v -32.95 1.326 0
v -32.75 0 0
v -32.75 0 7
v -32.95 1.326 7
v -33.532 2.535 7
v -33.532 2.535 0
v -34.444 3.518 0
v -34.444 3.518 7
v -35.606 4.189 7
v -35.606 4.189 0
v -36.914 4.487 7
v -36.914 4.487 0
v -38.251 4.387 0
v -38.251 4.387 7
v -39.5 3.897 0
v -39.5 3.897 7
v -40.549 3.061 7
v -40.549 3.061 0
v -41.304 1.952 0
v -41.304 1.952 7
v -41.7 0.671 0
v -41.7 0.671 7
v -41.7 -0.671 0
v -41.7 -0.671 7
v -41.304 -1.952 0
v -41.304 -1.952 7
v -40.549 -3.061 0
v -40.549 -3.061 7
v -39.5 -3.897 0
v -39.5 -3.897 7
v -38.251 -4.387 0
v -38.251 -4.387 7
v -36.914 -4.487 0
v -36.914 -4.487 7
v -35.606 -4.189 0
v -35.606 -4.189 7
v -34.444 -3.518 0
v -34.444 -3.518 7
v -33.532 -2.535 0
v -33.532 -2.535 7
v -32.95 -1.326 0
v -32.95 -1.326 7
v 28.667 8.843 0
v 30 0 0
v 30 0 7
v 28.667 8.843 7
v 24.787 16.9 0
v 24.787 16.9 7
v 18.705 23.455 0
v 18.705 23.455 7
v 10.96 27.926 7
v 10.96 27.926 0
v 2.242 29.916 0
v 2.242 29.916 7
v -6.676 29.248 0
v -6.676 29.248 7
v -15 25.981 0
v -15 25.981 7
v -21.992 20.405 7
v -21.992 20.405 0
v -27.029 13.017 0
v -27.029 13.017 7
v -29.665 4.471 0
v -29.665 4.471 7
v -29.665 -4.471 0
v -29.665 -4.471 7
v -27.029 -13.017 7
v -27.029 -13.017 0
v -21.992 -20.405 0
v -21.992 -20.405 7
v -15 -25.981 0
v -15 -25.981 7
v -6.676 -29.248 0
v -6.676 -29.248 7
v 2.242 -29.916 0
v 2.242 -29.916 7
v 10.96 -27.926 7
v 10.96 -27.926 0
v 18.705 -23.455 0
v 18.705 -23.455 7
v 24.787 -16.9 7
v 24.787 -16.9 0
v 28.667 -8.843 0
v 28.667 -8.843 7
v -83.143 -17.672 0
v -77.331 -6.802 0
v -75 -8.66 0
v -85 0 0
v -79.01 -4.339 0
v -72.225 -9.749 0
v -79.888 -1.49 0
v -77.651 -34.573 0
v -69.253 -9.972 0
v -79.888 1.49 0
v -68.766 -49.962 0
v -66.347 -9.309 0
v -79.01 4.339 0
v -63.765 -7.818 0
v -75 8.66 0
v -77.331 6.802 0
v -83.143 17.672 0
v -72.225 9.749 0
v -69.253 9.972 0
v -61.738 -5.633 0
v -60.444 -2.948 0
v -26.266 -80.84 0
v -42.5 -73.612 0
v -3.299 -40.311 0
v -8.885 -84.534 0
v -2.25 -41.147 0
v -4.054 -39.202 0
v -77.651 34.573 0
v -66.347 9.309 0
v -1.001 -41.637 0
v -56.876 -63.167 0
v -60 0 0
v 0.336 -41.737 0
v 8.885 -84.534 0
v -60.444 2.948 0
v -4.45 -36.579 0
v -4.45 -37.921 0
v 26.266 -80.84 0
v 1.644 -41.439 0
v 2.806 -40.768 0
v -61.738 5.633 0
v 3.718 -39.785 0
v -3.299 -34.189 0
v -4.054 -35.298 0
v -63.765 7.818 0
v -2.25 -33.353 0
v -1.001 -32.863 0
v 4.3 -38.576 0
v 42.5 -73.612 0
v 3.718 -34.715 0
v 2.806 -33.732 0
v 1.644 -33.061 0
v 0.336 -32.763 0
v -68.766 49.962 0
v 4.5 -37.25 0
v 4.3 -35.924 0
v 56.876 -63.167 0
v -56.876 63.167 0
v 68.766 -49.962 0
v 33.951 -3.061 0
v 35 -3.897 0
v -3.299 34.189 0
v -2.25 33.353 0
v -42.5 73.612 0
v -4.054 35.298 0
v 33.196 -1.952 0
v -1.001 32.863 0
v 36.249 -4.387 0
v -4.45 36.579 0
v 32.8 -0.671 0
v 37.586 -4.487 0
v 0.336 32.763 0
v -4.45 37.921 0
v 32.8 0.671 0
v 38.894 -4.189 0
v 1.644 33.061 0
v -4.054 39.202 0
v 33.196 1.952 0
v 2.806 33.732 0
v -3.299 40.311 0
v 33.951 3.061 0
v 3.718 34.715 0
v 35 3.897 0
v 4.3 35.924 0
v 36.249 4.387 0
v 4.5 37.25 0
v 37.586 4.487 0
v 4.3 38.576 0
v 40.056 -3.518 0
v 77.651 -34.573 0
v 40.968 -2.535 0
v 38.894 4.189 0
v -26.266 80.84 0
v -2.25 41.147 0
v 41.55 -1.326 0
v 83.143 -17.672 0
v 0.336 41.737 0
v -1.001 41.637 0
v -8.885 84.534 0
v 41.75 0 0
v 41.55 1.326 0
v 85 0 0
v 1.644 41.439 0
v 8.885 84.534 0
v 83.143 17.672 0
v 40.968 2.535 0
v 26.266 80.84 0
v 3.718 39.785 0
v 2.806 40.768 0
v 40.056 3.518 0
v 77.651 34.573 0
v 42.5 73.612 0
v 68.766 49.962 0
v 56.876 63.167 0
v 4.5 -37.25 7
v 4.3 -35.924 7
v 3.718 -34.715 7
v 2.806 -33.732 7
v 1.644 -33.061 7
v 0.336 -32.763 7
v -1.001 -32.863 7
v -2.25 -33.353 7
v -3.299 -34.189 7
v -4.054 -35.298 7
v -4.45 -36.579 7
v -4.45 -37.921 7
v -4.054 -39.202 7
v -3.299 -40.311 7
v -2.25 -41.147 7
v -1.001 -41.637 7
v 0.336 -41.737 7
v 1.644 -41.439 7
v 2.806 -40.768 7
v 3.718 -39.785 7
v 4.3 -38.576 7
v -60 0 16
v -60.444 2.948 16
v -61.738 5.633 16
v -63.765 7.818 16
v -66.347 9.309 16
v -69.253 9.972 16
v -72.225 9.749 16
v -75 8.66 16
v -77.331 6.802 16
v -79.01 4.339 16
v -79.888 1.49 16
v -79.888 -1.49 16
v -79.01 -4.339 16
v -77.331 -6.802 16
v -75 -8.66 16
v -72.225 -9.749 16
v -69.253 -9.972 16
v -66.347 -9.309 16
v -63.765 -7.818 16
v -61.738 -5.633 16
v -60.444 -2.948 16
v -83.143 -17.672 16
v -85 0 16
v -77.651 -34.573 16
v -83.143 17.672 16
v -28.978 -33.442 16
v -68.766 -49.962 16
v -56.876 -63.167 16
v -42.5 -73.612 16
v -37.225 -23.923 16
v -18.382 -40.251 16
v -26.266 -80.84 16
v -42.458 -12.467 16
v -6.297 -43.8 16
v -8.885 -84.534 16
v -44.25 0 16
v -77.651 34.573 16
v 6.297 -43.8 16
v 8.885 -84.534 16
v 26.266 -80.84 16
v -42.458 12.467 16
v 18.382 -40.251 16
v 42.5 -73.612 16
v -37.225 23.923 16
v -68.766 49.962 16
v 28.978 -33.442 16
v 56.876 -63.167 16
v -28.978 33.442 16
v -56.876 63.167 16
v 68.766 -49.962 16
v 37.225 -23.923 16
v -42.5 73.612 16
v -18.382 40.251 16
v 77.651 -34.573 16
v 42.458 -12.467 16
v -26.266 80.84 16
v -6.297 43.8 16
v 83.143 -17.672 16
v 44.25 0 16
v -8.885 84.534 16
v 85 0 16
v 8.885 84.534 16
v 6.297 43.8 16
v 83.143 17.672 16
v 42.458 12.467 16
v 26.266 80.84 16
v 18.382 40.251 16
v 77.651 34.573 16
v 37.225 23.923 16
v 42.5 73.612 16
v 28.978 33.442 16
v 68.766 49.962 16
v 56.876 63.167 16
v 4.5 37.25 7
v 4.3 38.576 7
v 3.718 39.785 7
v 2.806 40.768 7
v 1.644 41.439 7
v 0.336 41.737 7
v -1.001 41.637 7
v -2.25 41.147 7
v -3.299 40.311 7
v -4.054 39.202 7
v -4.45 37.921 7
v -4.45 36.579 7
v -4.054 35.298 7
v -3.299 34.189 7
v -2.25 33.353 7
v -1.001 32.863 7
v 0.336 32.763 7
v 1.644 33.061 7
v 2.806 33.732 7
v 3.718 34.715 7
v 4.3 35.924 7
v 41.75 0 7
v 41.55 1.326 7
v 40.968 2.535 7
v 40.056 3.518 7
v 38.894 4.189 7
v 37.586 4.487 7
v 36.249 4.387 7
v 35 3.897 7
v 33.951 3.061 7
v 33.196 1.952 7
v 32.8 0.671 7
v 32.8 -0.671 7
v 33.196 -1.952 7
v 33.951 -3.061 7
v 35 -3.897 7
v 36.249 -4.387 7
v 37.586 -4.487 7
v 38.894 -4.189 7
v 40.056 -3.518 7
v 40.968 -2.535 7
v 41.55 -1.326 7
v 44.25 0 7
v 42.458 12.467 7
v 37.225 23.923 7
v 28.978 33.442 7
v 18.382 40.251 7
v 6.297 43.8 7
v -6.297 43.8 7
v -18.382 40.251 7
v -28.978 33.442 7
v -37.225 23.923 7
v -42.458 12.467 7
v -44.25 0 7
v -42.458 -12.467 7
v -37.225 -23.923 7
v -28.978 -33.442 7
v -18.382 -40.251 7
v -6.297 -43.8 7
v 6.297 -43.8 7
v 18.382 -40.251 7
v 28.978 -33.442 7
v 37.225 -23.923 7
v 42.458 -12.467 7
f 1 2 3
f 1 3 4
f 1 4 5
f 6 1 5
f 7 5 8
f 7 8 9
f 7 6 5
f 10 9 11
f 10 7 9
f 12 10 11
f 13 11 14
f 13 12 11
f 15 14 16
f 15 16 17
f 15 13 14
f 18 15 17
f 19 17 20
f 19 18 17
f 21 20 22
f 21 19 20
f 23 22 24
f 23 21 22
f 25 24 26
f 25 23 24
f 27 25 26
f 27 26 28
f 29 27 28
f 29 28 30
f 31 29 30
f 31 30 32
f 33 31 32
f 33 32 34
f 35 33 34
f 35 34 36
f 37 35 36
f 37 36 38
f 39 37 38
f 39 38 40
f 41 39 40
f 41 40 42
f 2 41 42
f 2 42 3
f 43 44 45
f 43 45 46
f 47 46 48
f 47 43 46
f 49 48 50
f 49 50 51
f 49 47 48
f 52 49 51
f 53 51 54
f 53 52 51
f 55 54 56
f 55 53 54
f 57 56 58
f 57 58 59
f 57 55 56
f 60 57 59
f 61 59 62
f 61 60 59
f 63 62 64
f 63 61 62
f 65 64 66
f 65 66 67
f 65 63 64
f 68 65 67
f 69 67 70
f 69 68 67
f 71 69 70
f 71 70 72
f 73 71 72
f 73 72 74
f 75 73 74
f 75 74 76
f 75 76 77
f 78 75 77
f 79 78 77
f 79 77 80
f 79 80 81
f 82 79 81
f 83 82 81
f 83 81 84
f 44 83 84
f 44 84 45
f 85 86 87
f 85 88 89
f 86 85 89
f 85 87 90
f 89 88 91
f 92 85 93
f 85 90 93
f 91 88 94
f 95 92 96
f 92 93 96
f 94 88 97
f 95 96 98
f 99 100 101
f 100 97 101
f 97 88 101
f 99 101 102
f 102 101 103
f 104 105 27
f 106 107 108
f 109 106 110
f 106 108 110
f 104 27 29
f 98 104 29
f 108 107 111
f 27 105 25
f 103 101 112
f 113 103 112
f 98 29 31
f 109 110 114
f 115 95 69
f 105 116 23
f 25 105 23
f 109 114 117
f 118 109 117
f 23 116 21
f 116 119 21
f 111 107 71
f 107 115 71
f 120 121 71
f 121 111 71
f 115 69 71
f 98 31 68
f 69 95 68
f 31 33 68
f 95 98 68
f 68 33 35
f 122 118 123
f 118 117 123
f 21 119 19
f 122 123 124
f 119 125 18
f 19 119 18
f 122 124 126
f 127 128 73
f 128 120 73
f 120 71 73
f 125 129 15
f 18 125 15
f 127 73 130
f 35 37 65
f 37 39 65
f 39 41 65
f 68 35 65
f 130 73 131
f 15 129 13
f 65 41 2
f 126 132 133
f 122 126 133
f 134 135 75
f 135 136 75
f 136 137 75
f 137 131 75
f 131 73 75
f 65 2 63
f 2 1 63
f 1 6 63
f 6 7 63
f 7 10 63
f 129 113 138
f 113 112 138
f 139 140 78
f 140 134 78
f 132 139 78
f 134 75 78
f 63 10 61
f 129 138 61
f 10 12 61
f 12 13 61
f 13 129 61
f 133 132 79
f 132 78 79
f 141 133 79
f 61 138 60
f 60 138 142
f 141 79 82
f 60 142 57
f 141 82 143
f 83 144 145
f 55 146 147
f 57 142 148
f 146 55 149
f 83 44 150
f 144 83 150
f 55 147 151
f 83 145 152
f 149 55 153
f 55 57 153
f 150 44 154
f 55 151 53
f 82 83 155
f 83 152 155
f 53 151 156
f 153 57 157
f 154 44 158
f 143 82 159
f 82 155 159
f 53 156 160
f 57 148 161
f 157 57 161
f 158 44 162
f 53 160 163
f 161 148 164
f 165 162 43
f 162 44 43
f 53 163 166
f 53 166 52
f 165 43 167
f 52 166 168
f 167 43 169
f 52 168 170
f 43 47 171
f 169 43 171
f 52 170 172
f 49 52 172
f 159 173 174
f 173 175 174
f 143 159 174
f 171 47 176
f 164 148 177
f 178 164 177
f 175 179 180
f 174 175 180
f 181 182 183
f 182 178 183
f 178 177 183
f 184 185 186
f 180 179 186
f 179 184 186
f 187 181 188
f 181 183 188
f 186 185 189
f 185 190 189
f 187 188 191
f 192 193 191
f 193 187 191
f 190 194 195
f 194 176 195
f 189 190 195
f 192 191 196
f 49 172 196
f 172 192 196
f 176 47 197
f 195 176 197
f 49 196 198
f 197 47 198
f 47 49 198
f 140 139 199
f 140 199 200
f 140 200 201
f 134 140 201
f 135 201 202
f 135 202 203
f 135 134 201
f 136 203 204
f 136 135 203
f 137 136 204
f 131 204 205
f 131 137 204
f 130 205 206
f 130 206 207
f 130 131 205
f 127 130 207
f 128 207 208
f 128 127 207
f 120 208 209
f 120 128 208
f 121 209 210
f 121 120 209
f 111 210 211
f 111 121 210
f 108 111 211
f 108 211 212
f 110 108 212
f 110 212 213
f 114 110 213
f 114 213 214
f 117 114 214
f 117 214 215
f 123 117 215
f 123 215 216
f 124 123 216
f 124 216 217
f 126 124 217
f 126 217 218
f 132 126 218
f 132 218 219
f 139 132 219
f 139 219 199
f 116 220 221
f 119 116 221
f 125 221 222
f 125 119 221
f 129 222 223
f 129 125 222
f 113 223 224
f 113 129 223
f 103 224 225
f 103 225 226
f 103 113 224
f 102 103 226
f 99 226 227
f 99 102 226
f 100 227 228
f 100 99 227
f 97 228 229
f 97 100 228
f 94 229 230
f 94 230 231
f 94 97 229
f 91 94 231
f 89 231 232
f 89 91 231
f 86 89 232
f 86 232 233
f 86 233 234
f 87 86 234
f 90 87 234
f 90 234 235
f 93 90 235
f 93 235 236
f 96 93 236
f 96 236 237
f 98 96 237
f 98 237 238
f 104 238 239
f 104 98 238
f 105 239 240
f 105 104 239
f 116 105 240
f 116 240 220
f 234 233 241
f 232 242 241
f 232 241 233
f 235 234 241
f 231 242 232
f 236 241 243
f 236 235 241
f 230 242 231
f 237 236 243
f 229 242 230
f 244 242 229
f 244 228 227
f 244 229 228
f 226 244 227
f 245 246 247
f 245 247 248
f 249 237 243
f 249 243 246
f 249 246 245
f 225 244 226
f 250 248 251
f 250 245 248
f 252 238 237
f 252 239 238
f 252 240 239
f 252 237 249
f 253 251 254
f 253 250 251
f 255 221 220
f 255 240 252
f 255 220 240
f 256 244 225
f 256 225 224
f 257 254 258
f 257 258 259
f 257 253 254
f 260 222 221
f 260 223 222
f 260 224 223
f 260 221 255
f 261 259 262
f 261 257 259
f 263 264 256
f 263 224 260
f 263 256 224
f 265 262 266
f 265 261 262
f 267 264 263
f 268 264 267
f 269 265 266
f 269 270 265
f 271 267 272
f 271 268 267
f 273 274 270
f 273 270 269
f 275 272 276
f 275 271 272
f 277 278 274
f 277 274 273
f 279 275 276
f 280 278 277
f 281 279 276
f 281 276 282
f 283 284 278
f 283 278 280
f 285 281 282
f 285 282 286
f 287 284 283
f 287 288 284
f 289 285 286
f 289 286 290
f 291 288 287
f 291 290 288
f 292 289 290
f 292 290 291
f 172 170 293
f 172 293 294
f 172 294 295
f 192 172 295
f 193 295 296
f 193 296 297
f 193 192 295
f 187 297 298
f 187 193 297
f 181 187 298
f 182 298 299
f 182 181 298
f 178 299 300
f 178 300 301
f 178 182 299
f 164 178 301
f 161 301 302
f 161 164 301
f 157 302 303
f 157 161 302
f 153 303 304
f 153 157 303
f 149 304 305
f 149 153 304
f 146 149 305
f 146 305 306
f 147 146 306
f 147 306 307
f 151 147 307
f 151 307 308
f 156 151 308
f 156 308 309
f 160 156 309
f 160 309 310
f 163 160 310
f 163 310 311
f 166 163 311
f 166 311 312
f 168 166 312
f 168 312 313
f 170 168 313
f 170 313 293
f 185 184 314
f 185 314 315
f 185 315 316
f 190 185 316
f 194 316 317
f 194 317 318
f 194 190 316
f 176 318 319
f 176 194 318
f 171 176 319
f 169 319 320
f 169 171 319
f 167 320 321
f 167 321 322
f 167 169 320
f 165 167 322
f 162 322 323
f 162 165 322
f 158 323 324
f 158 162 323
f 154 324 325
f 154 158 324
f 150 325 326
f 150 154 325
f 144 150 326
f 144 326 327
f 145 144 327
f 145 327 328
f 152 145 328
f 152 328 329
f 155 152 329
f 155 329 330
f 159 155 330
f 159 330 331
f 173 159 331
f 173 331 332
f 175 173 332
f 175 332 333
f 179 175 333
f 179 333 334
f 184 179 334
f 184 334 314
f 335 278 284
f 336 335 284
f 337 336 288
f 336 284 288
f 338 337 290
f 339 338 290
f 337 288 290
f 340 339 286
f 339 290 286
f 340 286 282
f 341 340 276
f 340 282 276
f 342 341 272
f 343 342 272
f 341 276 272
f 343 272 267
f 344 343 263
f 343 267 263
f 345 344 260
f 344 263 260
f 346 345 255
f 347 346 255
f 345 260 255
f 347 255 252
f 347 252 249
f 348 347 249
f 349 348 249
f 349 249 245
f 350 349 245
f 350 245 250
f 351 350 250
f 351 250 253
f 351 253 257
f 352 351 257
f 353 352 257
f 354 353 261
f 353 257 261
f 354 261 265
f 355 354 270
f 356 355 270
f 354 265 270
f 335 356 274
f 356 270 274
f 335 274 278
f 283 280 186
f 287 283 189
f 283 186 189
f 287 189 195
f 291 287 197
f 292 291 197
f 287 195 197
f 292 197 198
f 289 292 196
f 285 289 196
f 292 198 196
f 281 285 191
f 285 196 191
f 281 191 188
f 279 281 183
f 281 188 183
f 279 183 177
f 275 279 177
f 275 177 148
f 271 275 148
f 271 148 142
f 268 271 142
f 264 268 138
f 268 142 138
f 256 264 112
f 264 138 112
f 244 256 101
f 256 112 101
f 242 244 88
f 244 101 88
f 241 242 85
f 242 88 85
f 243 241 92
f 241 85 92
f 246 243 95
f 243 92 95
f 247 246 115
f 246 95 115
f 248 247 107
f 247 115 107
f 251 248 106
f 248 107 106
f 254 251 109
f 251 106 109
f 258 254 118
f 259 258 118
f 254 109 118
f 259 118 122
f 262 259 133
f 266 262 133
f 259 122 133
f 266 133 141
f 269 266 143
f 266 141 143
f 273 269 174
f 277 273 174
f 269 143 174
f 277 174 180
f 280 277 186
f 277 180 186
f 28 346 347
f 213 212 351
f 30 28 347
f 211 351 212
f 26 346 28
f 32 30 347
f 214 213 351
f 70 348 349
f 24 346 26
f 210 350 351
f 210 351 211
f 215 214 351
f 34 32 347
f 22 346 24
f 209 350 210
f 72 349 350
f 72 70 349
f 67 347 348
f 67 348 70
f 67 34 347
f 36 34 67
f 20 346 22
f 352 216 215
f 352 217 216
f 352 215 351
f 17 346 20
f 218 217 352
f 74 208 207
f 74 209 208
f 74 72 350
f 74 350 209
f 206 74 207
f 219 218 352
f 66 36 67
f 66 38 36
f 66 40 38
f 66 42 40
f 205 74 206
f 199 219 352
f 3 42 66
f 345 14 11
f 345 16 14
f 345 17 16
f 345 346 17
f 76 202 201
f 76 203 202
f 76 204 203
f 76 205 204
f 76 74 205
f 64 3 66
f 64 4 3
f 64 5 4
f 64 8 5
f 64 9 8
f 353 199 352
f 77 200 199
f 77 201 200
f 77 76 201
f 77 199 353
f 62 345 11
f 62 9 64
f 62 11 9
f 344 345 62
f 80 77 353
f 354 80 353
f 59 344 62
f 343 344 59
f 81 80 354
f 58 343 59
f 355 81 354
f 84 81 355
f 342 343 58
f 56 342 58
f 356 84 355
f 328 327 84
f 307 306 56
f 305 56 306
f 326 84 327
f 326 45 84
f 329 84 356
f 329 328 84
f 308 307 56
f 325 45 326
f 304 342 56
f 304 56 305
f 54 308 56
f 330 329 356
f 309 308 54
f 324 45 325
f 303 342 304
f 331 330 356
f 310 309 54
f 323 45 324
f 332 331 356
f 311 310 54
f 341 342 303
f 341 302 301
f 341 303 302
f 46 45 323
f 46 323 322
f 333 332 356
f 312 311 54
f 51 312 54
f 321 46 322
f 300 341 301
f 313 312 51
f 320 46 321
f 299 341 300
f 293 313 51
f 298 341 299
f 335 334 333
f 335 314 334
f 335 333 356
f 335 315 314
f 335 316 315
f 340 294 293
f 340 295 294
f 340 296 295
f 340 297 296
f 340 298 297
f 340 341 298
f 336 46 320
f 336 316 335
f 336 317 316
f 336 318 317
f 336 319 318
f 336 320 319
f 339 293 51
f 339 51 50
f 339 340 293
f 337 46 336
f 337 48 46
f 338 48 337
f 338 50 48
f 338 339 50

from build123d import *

# Parameters (mm, degrees)
F0_R     = 85
F0_R_2   = 4.5
F0_R_3   = 10
F0_R_4   = 30
F1_DEPTH = 16
F2_R     = 44.25
F2_R_2   = 4.5
F2_R_3   = 30
F3_DEPTH = 9


with BuildPart() as f1:
    # F0 (on Top) → F1 (new body)
    with BuildSketch(Plane.XY):
        Circle(F0_R)
        with Locations((0, -37.25)):
            Circle(F0_R_2, mode=Mode.SUBTRACT)
        with Locations((-70, 0)):
            Circle(F0_R_3, mode=Mode.SUBTRACT)
        with Locations((-37.25, 0)):
            Circle(F0_R_2, mode=Mode.SUBTRACT)
        Circle(F0_R_4, mode=Mode.SUBTRACT)
        with Locations((37.25, 0)):
            Circle(F0_R_2, mode=Mode.SUBTRACT)
        with Locations((0, 37.25)):
            Circle(F0_R_2, mode=Mode.SUBTRACT)
    extrude(amount=F1_DEPTH)

    # F2 (on face) → F3 (cut)
    with BuildSketch(Plane.XY.offset(16)):
        Circle(F2_R)
        with Locations((0, -37.25)):
            Circle(F2_R_2, mode=Mode.SUBTRACT)
        with Locations((-37.25, 0)):
            Circle(F2_R_2, mode=Mode.SUBTRACT)
        Circle(F2_R_3, mode=Mode.SUBTRACT)
        with Locations((37.25, 0)):
            Circle(F2_R_2, mode=Mode.SUBTRACT)
        with Locations((0, 37.25)):
            Circle(F2_R_2, mode=Mode.SUBTRACT)
    extrude(amount=-F3_DEPTH, mode=Mode.SUBTRACT)


solid = f1.part
